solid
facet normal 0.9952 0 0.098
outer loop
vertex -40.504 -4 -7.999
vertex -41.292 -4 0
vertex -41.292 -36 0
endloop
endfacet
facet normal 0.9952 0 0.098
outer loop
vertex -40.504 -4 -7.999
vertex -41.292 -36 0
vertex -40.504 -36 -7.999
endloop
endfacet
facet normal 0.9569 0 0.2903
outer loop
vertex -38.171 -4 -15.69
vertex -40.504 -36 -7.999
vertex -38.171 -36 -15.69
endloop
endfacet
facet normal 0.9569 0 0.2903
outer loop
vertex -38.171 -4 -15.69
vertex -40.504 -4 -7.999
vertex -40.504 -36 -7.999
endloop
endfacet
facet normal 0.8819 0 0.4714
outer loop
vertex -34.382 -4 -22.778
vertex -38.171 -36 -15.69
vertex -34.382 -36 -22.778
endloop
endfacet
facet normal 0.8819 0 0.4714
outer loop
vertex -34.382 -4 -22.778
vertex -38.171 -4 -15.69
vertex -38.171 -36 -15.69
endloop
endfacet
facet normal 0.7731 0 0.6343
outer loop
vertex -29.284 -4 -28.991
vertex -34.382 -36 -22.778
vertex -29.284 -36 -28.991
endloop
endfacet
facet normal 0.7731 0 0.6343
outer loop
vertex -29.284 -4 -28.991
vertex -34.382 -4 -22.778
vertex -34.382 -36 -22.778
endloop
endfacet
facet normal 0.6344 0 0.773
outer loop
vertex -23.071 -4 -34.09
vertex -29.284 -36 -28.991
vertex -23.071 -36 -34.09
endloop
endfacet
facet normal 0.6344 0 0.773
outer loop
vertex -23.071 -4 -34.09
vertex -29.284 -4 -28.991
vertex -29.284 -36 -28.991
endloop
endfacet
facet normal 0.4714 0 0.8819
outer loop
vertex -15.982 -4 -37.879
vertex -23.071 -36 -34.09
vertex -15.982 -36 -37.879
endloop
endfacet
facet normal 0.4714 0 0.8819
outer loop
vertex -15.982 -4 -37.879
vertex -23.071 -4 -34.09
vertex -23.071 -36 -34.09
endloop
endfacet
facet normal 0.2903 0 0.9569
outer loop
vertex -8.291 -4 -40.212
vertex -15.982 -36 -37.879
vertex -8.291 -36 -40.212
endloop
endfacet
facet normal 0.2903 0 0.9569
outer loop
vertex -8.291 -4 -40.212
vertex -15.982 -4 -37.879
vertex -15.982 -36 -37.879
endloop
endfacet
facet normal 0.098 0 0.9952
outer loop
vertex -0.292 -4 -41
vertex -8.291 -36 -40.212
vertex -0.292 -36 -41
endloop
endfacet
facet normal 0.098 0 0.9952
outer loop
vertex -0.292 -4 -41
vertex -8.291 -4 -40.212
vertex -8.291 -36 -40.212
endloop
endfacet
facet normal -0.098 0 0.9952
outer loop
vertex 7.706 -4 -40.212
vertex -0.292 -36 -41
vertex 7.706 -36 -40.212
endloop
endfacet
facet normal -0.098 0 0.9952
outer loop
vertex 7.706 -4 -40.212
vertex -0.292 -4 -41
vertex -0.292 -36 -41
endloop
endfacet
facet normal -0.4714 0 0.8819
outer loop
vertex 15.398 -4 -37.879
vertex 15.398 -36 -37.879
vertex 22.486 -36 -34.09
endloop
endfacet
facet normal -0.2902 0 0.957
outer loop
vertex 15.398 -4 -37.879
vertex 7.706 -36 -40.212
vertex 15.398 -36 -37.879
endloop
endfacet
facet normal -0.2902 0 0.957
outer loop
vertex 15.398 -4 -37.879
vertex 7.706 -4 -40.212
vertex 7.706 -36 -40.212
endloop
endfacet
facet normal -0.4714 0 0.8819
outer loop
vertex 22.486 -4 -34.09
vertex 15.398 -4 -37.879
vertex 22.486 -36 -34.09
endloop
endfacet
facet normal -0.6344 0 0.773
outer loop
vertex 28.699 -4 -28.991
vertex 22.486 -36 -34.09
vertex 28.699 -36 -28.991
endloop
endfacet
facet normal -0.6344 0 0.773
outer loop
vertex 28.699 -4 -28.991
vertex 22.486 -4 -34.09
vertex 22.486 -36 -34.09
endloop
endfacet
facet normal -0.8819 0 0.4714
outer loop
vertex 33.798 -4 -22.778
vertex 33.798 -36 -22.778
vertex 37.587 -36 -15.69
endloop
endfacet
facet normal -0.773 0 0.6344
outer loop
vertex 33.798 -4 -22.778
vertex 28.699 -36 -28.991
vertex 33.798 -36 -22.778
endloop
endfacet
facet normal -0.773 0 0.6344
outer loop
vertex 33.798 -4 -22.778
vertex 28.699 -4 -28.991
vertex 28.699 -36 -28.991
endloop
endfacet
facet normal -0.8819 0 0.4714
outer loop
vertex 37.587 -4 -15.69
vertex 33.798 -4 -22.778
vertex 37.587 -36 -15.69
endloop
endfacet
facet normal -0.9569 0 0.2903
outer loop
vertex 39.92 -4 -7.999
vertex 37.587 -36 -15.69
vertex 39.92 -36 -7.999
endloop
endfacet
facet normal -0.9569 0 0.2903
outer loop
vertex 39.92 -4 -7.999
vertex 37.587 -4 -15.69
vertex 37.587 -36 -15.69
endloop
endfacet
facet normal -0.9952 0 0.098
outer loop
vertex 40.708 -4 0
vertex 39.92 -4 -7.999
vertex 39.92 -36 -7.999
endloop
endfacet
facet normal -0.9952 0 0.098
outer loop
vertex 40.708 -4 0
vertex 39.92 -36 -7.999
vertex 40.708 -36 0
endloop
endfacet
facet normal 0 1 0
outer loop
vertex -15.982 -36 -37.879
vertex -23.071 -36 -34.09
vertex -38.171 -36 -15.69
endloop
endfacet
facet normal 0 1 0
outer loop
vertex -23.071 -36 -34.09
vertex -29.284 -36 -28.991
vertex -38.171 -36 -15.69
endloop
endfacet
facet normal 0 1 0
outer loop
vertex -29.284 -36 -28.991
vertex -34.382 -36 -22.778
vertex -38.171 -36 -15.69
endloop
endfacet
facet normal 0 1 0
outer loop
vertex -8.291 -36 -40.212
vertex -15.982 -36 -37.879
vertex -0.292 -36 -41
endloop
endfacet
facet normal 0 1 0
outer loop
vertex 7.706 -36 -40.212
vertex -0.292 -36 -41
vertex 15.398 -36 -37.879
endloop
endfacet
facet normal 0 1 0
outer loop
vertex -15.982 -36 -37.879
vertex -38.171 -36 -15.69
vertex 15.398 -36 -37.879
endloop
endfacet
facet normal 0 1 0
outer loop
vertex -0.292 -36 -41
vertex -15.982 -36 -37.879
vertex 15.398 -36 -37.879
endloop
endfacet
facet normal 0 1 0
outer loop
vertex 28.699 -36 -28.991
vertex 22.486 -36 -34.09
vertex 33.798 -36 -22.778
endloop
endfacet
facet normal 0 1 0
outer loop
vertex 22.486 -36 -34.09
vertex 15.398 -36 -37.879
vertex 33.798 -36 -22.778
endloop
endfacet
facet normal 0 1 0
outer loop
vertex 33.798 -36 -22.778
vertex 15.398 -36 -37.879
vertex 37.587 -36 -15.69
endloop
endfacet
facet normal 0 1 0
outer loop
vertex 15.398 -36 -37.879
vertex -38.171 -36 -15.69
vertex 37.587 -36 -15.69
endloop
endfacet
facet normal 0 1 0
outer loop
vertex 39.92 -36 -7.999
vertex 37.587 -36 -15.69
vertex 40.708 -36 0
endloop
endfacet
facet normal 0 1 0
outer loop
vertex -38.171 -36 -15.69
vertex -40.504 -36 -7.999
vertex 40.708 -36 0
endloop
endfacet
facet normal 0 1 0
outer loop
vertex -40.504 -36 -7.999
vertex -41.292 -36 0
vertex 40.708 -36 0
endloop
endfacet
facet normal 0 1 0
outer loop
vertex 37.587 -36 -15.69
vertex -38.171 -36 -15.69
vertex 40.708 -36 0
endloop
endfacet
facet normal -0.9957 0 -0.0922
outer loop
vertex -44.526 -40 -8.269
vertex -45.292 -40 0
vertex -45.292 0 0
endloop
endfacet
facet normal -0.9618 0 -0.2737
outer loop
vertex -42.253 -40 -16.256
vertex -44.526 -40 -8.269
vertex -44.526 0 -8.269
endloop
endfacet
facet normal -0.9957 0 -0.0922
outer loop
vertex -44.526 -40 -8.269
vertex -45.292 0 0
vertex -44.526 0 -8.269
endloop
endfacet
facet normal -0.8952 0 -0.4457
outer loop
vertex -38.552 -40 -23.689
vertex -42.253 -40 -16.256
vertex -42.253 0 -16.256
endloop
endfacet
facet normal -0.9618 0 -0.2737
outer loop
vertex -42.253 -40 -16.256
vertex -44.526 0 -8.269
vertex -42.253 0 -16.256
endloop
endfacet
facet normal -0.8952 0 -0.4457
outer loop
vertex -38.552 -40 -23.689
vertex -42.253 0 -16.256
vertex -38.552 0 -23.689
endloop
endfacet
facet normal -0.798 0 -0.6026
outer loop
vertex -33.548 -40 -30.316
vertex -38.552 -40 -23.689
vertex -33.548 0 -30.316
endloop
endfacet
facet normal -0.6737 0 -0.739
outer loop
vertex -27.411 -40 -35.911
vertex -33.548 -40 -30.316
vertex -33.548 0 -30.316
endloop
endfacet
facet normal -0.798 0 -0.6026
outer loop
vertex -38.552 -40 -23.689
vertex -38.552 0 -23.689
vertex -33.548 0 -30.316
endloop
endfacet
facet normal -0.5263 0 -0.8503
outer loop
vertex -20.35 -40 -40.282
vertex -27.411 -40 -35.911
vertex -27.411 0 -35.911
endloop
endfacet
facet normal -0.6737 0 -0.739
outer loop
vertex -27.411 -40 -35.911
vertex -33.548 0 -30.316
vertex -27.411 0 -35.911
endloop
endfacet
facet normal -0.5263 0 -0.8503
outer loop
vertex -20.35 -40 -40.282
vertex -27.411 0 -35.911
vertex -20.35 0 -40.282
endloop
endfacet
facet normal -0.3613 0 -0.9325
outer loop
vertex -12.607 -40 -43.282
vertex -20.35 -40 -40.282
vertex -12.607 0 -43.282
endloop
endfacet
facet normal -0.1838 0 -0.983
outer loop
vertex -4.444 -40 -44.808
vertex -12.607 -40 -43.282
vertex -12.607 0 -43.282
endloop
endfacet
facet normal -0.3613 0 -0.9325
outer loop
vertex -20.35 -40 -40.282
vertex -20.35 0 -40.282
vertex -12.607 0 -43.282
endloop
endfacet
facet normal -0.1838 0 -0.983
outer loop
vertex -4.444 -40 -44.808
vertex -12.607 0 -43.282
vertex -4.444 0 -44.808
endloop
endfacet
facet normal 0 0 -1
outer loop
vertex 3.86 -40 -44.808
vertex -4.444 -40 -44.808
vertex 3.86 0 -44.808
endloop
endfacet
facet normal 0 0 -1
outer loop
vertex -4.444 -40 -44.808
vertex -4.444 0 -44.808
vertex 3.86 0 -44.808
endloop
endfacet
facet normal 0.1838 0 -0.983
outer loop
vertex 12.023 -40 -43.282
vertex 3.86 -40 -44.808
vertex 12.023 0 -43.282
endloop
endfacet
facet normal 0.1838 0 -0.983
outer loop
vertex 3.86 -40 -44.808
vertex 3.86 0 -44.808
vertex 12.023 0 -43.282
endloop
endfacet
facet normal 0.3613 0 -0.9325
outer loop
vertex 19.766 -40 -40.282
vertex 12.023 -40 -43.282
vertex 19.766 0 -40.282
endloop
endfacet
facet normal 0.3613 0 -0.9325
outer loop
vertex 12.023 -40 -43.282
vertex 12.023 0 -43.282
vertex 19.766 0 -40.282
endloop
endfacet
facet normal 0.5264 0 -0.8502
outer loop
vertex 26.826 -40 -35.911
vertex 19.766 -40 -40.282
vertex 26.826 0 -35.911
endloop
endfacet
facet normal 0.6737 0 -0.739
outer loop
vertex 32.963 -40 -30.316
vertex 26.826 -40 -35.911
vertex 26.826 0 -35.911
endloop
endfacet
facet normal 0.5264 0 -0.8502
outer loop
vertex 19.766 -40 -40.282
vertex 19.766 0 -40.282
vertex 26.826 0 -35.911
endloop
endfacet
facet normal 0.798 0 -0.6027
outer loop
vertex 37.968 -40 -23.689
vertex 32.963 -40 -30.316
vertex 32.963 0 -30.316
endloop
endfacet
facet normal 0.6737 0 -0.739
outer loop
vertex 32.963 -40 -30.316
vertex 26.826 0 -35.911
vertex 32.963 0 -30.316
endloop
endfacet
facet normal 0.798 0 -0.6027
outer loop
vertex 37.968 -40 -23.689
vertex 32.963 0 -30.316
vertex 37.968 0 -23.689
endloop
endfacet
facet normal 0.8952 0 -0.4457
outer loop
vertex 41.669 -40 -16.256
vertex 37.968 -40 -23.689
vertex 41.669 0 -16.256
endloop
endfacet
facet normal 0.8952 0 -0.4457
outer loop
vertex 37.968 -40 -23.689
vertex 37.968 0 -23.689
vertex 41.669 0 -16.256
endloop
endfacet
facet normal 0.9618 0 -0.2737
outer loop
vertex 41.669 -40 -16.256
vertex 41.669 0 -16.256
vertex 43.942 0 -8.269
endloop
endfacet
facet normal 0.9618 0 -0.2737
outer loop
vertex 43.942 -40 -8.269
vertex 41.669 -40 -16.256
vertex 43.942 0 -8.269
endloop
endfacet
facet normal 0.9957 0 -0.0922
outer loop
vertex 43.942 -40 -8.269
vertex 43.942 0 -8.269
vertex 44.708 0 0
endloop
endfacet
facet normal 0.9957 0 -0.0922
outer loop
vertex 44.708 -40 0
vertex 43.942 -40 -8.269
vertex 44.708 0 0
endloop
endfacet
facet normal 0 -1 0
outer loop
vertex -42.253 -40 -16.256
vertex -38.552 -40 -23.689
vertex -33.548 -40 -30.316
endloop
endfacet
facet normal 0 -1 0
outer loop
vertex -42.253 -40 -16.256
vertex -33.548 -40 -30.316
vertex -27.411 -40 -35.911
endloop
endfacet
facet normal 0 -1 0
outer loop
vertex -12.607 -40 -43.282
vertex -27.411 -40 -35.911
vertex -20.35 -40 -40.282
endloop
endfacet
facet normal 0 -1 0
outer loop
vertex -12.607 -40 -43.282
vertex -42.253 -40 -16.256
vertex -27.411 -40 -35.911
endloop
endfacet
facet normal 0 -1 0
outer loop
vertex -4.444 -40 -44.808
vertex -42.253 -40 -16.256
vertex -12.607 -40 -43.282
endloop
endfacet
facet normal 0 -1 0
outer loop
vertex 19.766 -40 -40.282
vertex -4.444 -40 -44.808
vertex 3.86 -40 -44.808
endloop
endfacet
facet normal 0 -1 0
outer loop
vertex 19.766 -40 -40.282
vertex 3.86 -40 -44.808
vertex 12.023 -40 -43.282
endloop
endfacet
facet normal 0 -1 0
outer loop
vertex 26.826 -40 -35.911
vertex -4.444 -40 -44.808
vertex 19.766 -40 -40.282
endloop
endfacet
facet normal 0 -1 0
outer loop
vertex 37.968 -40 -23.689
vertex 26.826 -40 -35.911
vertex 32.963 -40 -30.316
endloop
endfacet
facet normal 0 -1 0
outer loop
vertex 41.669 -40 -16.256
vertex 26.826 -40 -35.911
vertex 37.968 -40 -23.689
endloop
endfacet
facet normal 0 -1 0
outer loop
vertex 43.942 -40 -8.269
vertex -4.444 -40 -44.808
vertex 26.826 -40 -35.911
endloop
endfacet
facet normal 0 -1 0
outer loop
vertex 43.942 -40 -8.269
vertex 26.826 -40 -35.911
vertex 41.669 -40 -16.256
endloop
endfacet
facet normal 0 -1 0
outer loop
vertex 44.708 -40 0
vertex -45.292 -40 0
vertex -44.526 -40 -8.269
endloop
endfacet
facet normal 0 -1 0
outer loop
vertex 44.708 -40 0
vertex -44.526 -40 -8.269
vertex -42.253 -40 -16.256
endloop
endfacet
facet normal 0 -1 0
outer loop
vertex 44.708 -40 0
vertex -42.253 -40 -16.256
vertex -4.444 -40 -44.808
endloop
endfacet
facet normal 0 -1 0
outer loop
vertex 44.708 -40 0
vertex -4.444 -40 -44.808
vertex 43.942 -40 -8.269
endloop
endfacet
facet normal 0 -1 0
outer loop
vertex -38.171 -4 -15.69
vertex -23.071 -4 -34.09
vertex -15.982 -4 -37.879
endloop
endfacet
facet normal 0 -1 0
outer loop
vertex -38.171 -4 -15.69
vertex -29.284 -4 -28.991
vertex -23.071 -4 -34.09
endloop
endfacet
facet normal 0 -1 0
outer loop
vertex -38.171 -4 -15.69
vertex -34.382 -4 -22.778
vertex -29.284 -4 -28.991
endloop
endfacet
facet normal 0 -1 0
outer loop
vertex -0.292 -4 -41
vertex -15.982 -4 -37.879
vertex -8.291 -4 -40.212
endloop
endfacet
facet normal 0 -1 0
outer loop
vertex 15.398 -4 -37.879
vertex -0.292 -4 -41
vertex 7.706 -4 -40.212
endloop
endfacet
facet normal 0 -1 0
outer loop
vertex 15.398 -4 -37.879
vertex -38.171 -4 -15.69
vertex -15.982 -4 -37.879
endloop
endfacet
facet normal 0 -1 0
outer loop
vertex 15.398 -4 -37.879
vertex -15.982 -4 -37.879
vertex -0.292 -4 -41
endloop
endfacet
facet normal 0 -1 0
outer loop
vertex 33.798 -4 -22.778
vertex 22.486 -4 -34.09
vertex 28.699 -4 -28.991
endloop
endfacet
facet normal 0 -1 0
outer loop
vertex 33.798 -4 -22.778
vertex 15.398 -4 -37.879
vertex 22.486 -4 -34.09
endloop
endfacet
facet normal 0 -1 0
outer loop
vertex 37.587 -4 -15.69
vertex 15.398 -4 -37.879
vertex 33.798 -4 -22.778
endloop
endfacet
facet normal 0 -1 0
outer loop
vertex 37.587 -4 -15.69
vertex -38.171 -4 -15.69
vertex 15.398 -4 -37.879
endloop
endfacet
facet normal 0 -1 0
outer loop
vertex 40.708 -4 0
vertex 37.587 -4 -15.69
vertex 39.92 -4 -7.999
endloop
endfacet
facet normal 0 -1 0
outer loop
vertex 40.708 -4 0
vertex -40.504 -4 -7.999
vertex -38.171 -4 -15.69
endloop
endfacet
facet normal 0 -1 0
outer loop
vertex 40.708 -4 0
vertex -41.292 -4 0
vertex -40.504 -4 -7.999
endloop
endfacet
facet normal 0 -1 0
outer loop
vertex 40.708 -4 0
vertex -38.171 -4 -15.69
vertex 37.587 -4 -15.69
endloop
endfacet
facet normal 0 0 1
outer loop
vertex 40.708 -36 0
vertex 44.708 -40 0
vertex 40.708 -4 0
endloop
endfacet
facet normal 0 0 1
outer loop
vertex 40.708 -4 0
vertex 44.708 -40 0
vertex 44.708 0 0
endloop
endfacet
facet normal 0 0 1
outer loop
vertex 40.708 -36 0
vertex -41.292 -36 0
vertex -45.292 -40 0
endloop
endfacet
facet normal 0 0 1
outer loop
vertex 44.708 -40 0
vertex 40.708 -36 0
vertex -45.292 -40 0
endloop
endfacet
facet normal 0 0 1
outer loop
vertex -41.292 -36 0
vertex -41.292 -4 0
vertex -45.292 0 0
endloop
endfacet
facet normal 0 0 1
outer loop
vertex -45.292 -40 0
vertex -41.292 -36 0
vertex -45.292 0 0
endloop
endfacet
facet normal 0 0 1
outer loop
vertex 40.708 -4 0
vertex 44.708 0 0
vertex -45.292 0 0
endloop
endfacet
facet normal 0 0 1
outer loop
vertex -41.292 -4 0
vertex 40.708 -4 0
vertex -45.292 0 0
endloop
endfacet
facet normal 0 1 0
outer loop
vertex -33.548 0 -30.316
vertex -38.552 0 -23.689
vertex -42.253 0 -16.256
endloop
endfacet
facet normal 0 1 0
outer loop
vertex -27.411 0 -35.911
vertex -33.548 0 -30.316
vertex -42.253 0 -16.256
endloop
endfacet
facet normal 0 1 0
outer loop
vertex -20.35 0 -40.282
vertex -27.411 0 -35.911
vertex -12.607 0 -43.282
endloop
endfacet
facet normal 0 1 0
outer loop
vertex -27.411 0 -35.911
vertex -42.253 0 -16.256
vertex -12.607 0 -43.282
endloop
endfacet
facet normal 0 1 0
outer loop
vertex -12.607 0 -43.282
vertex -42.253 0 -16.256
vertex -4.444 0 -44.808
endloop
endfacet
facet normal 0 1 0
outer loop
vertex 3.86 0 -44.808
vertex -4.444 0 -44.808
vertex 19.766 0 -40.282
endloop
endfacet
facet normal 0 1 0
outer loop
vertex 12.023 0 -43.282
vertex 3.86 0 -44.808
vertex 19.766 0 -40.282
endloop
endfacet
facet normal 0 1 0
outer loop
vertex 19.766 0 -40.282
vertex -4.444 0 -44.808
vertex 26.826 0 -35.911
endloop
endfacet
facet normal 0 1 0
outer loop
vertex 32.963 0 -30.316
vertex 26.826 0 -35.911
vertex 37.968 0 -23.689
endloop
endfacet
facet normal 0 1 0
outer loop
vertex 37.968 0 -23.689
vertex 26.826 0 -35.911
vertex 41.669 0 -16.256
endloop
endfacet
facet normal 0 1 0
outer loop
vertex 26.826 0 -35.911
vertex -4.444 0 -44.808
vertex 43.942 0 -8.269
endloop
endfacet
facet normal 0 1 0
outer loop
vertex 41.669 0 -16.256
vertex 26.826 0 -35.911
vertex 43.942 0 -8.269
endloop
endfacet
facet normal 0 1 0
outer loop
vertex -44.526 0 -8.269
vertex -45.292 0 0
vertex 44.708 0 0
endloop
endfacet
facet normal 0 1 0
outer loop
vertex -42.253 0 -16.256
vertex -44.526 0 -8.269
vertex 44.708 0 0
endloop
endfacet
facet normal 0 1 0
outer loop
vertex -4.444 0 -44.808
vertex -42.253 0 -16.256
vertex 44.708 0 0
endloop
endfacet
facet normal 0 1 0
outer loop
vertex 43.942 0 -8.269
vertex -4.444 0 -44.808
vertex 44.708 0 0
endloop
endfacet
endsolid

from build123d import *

# Parameters (mm, degrees)
F1_DEPTH = 40
F2_T     = -4


with BuildPart() as f1:
    # F0 (on Front) → F1 (new body)
    with BuildSketch(Plane.XZ):
        with BuildLine():
            Line((44.70779, 0), (-45.29221, 0))
            ThreePointArc((-45.29221, 0), (-0.29221, -45), (44.70779, 0))
        make_face()
    extrude(amount=F1_DEPTH)

    # F2
    f2_openings = [f1.faces().sort_by_distance(p)[0] for p in [
        (-0.29221, -20, 0),
    ]]
    offset(amount=F2_T, openings=f2_openings)


solid = f1.part
